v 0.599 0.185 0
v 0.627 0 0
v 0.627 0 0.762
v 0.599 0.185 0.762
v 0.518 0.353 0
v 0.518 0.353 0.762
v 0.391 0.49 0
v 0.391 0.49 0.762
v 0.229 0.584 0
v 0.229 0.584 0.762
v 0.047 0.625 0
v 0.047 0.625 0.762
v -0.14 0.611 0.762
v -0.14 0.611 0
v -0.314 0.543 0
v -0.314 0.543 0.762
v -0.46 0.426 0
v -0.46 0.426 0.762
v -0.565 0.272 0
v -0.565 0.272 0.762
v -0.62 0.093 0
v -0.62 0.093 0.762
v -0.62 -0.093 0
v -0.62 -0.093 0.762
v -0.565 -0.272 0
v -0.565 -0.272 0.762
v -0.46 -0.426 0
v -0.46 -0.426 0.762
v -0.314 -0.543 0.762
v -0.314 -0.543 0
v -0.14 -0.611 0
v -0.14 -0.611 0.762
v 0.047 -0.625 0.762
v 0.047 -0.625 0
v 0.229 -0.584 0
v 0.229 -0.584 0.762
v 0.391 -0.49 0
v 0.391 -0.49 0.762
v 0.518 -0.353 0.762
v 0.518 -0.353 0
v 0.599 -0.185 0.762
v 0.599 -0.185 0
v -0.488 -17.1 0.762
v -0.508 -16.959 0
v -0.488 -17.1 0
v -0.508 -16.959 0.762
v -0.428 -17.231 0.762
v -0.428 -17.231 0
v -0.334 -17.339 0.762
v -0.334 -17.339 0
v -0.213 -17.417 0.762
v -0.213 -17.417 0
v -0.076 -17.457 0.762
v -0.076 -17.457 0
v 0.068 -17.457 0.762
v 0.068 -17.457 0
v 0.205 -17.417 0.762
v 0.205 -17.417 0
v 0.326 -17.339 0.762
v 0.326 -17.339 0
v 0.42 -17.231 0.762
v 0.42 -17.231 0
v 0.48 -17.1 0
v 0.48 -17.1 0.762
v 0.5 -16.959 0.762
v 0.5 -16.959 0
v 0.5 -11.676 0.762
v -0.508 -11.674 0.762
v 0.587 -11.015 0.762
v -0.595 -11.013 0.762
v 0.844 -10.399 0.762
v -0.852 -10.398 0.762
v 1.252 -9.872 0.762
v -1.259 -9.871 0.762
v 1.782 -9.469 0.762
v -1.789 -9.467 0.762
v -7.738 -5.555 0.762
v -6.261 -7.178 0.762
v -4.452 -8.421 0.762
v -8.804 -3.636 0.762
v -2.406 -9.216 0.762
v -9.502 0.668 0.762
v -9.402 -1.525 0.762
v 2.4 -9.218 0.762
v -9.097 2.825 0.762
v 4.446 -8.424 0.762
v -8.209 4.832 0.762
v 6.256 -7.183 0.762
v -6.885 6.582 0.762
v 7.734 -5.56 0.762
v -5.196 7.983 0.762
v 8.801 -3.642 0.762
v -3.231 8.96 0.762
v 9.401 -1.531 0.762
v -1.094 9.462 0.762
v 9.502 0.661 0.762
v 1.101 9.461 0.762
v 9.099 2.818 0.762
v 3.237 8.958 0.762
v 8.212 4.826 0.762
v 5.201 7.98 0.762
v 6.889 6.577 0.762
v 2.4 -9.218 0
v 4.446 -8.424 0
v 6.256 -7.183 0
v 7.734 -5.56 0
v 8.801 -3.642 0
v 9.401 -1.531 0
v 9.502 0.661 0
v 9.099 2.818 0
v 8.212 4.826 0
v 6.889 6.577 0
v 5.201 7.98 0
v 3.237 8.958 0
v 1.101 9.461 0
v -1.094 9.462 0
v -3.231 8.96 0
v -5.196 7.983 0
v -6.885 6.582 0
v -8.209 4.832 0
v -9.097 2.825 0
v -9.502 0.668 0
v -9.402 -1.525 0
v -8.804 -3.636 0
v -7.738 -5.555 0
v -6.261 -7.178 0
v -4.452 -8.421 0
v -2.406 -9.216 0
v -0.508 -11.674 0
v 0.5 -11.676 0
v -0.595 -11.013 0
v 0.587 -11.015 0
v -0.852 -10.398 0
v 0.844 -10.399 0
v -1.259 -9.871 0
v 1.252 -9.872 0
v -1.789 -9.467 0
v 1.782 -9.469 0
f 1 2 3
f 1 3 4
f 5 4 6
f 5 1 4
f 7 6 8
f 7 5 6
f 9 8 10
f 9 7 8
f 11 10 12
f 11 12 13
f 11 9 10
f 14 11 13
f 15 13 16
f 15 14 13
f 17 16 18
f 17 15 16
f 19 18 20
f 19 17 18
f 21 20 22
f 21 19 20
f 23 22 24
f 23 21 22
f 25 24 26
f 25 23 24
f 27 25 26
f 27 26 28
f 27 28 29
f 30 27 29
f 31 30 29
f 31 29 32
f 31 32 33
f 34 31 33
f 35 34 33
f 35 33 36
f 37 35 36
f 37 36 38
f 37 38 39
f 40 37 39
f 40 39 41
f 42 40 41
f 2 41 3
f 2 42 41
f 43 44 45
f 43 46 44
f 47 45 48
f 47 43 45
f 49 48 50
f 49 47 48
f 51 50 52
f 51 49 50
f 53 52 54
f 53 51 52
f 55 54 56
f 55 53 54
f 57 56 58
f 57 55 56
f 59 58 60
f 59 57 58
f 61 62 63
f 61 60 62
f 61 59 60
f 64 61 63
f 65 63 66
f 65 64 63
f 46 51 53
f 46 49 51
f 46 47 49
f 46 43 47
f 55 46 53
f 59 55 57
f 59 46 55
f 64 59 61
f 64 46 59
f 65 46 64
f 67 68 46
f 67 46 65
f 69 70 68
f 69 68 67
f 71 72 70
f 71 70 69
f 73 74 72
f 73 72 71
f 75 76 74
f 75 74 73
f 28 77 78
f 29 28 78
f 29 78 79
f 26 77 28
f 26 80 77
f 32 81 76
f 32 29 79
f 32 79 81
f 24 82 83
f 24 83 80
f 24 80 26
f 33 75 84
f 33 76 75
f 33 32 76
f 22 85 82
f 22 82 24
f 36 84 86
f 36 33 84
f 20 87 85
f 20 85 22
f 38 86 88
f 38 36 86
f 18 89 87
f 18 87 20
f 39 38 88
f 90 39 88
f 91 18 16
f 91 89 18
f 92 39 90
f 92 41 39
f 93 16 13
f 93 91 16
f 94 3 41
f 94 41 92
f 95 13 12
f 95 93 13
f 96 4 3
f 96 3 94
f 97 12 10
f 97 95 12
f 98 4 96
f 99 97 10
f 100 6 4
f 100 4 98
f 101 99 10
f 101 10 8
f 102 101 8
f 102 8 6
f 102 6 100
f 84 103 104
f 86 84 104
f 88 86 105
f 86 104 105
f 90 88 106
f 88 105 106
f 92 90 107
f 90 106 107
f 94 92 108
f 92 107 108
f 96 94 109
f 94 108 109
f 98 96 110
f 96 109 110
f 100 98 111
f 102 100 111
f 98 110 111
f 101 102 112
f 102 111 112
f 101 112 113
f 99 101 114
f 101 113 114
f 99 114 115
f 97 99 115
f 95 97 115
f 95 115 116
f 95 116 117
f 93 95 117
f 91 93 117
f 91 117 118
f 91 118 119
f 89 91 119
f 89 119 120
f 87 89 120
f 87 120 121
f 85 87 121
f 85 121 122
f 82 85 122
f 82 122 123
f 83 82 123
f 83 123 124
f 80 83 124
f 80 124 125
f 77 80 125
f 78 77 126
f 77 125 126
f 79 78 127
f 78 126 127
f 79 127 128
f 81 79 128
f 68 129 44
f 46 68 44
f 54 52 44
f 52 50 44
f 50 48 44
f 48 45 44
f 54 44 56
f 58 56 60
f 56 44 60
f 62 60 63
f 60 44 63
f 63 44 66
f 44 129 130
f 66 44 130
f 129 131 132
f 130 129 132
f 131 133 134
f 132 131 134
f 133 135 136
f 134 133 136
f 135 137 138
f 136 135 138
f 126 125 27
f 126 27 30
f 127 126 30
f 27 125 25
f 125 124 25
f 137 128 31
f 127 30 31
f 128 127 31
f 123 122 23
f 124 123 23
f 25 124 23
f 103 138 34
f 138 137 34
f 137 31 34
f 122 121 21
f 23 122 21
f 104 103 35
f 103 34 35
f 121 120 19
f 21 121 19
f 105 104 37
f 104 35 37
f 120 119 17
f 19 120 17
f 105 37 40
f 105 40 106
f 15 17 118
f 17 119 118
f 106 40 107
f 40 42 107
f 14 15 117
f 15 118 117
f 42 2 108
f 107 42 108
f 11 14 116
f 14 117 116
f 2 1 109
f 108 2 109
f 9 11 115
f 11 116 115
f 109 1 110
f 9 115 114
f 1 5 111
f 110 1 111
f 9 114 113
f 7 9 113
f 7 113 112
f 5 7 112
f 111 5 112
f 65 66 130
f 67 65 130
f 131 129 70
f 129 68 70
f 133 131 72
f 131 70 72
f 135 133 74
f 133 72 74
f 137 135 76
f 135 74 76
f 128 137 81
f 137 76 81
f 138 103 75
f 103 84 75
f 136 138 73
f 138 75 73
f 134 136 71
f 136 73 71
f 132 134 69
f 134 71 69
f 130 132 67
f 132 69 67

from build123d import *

# Parameters (mm, degrees)
SKETCH1_R           = 0.627
BOSS_EXTRUDE1_DEPTH = 0.762
FILLET1_R           = 2.54
FILLET2_RADIUS      = 0.5039995
FILLET2_LENGTH      = 0.762


with BuildPart() as part:
    # Sketch1 → Boss-Extrude1 (new body)
    with BuildSketch(Plane.XY):
        with BuildLine():
            Line((-0.508, -9.511443686), (-0.508, -17.4625))
            Line((-0.508, -17.4625), (0.499999, -17.4625))
            Line((0.499999, -17.4625), (0.499999, -9.51186764))
            ThreePointArc((0.499999, -9.51186764), (0.004006112, 9.524999158), (-0.508, -9.511443686))
        make_face()
        Circle(SKETCH1_R, mode=Mode.SUBTRACT)
    extrude(amount=BOSS_EXTRUDE1_DEPTH)

    # Fillet1
    fillet1_edges = [part.edges().sort_by_distance(p)[0] for p in [
        (0.499999, -9.51186764, 0.381),
        (-0.508, -9.511443686, 0.381),
    ]]
    fillet(fillet1_edges, radius=FILLET1_R)

    # Fillet2: full round fillet: the end face becomes a half cylinder, R = half its width
    fillet2_face = Plane((-0.0040005, -17.4625, 0.381), x_dir=(0, 0, 1), z_dir=(0, -1, 0))  # on the end face: x along it, z out of the body
    fillet2_slab = fillet2_face.offset(-FILLET2_RADIUS / 2) * Box(FILLET2_LENGTH, 2 * FILLET2_RADIUS, FILLET2_RADIUS, mode=Mode.PRIVATE)  # the body's end, R deep
    fillet2_round = Plane((-0.0040005, -16.9585005, 0.381), x_dir=(0, -1, 0), z_dir=(0, 0, 1)) * Cylinder(FILLET2_RADIUS, FILLET2_LENGTH, mode=Mode.PRIVATE)  # its axis R under the face
    add(fillet2_slab - fillet2_round, mode=Mode.SUBTRACT)


solid = part.part
